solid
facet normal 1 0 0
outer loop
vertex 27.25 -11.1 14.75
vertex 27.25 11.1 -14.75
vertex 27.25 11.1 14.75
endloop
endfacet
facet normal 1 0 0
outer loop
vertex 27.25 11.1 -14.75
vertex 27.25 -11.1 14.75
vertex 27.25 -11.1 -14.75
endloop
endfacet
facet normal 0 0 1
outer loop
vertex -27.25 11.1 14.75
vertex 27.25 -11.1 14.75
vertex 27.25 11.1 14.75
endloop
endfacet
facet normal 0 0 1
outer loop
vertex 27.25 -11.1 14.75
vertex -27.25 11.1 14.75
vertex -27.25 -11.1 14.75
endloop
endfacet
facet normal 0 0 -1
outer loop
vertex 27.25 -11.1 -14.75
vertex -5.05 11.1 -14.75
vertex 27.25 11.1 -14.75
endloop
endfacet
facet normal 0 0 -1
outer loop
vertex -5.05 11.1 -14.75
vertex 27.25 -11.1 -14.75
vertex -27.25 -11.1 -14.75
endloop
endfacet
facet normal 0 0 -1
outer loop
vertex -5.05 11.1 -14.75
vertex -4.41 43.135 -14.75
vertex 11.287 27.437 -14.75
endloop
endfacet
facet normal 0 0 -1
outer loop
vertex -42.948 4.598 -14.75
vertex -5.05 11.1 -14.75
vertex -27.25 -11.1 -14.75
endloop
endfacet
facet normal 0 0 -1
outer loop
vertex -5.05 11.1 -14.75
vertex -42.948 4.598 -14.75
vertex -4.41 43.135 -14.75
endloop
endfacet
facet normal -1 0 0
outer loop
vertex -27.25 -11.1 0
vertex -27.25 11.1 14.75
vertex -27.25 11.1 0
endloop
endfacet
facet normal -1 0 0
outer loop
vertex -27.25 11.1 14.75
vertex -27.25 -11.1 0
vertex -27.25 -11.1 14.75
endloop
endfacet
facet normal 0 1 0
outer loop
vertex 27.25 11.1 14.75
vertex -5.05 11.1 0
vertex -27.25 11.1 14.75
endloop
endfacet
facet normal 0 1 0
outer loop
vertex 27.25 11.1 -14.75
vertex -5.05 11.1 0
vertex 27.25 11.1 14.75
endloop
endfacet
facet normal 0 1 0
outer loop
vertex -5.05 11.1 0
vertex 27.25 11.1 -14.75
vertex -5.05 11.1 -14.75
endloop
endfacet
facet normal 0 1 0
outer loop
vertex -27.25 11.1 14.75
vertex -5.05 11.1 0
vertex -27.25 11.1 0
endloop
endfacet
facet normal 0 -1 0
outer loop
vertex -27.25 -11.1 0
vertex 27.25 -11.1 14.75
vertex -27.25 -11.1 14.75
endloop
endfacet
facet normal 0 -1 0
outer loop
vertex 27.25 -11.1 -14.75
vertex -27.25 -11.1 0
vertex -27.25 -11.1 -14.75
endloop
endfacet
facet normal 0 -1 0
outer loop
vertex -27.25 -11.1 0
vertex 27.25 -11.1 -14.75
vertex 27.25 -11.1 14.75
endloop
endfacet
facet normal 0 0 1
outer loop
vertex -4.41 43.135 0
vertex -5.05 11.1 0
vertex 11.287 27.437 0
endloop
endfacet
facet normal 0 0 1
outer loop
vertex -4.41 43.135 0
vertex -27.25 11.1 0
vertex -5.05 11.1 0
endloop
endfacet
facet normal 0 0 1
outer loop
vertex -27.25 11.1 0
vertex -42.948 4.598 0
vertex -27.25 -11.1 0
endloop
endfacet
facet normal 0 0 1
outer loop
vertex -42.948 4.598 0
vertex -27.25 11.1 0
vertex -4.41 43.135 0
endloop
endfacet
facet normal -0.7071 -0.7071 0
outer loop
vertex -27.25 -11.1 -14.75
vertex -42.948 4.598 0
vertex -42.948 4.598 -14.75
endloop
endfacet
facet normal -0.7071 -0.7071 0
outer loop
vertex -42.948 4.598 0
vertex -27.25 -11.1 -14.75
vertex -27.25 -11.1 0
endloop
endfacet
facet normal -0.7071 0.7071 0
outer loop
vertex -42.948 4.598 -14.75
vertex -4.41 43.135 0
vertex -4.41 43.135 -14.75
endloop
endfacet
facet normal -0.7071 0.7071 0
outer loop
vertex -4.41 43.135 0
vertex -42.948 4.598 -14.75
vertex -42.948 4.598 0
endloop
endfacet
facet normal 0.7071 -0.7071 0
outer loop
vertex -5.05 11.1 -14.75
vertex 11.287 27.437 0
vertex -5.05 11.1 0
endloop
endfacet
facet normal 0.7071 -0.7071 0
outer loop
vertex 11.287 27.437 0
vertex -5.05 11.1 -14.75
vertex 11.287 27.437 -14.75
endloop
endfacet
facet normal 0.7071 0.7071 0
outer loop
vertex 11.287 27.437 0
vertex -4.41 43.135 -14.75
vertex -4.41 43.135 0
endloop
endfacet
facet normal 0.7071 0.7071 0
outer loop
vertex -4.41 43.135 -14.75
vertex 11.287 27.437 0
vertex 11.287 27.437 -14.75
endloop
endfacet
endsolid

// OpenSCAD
module wedge_clevis() {
    difference() {
        union() {
            // Central block
            translate([-27.25, -11.1, -14.75])
                cube([54.5, 22.2, 29.5]);

            // Flared arms
            translate([-27.25, -11.1, -14.75])
                scale([1, 1, 0.5])
                rotate([0, 0, 45])
                cube([54.5, 22.2, 29.5]);
        }

        // Triangular through-openings
        translate([-27.25, 0, -14.75])
            rotate([0, 90, 0])
            pyramid_tunnel();

        translate([27.25, 0, -14.75])
            rotate([0, -90, 0])
            pyramid_tunnel();
    }
}

module pyramid_tunnel() {
    polyhedron(
        points=[
            [0, 0, 0], [0, 22.2, 0], [0, 11.1, 29.5],
            [54.5, 0, 0], [54.5, 22.2, 0], [54.5, 11.1, 29.5]
        ],
        faces=[
            [0, 1, 2], [3, 4, 5],
            [0, 1, 4, 3], [1, 2, 5, 4], [2, 0, 3, 5]
        ]
    );
}

wedge_clevis();
